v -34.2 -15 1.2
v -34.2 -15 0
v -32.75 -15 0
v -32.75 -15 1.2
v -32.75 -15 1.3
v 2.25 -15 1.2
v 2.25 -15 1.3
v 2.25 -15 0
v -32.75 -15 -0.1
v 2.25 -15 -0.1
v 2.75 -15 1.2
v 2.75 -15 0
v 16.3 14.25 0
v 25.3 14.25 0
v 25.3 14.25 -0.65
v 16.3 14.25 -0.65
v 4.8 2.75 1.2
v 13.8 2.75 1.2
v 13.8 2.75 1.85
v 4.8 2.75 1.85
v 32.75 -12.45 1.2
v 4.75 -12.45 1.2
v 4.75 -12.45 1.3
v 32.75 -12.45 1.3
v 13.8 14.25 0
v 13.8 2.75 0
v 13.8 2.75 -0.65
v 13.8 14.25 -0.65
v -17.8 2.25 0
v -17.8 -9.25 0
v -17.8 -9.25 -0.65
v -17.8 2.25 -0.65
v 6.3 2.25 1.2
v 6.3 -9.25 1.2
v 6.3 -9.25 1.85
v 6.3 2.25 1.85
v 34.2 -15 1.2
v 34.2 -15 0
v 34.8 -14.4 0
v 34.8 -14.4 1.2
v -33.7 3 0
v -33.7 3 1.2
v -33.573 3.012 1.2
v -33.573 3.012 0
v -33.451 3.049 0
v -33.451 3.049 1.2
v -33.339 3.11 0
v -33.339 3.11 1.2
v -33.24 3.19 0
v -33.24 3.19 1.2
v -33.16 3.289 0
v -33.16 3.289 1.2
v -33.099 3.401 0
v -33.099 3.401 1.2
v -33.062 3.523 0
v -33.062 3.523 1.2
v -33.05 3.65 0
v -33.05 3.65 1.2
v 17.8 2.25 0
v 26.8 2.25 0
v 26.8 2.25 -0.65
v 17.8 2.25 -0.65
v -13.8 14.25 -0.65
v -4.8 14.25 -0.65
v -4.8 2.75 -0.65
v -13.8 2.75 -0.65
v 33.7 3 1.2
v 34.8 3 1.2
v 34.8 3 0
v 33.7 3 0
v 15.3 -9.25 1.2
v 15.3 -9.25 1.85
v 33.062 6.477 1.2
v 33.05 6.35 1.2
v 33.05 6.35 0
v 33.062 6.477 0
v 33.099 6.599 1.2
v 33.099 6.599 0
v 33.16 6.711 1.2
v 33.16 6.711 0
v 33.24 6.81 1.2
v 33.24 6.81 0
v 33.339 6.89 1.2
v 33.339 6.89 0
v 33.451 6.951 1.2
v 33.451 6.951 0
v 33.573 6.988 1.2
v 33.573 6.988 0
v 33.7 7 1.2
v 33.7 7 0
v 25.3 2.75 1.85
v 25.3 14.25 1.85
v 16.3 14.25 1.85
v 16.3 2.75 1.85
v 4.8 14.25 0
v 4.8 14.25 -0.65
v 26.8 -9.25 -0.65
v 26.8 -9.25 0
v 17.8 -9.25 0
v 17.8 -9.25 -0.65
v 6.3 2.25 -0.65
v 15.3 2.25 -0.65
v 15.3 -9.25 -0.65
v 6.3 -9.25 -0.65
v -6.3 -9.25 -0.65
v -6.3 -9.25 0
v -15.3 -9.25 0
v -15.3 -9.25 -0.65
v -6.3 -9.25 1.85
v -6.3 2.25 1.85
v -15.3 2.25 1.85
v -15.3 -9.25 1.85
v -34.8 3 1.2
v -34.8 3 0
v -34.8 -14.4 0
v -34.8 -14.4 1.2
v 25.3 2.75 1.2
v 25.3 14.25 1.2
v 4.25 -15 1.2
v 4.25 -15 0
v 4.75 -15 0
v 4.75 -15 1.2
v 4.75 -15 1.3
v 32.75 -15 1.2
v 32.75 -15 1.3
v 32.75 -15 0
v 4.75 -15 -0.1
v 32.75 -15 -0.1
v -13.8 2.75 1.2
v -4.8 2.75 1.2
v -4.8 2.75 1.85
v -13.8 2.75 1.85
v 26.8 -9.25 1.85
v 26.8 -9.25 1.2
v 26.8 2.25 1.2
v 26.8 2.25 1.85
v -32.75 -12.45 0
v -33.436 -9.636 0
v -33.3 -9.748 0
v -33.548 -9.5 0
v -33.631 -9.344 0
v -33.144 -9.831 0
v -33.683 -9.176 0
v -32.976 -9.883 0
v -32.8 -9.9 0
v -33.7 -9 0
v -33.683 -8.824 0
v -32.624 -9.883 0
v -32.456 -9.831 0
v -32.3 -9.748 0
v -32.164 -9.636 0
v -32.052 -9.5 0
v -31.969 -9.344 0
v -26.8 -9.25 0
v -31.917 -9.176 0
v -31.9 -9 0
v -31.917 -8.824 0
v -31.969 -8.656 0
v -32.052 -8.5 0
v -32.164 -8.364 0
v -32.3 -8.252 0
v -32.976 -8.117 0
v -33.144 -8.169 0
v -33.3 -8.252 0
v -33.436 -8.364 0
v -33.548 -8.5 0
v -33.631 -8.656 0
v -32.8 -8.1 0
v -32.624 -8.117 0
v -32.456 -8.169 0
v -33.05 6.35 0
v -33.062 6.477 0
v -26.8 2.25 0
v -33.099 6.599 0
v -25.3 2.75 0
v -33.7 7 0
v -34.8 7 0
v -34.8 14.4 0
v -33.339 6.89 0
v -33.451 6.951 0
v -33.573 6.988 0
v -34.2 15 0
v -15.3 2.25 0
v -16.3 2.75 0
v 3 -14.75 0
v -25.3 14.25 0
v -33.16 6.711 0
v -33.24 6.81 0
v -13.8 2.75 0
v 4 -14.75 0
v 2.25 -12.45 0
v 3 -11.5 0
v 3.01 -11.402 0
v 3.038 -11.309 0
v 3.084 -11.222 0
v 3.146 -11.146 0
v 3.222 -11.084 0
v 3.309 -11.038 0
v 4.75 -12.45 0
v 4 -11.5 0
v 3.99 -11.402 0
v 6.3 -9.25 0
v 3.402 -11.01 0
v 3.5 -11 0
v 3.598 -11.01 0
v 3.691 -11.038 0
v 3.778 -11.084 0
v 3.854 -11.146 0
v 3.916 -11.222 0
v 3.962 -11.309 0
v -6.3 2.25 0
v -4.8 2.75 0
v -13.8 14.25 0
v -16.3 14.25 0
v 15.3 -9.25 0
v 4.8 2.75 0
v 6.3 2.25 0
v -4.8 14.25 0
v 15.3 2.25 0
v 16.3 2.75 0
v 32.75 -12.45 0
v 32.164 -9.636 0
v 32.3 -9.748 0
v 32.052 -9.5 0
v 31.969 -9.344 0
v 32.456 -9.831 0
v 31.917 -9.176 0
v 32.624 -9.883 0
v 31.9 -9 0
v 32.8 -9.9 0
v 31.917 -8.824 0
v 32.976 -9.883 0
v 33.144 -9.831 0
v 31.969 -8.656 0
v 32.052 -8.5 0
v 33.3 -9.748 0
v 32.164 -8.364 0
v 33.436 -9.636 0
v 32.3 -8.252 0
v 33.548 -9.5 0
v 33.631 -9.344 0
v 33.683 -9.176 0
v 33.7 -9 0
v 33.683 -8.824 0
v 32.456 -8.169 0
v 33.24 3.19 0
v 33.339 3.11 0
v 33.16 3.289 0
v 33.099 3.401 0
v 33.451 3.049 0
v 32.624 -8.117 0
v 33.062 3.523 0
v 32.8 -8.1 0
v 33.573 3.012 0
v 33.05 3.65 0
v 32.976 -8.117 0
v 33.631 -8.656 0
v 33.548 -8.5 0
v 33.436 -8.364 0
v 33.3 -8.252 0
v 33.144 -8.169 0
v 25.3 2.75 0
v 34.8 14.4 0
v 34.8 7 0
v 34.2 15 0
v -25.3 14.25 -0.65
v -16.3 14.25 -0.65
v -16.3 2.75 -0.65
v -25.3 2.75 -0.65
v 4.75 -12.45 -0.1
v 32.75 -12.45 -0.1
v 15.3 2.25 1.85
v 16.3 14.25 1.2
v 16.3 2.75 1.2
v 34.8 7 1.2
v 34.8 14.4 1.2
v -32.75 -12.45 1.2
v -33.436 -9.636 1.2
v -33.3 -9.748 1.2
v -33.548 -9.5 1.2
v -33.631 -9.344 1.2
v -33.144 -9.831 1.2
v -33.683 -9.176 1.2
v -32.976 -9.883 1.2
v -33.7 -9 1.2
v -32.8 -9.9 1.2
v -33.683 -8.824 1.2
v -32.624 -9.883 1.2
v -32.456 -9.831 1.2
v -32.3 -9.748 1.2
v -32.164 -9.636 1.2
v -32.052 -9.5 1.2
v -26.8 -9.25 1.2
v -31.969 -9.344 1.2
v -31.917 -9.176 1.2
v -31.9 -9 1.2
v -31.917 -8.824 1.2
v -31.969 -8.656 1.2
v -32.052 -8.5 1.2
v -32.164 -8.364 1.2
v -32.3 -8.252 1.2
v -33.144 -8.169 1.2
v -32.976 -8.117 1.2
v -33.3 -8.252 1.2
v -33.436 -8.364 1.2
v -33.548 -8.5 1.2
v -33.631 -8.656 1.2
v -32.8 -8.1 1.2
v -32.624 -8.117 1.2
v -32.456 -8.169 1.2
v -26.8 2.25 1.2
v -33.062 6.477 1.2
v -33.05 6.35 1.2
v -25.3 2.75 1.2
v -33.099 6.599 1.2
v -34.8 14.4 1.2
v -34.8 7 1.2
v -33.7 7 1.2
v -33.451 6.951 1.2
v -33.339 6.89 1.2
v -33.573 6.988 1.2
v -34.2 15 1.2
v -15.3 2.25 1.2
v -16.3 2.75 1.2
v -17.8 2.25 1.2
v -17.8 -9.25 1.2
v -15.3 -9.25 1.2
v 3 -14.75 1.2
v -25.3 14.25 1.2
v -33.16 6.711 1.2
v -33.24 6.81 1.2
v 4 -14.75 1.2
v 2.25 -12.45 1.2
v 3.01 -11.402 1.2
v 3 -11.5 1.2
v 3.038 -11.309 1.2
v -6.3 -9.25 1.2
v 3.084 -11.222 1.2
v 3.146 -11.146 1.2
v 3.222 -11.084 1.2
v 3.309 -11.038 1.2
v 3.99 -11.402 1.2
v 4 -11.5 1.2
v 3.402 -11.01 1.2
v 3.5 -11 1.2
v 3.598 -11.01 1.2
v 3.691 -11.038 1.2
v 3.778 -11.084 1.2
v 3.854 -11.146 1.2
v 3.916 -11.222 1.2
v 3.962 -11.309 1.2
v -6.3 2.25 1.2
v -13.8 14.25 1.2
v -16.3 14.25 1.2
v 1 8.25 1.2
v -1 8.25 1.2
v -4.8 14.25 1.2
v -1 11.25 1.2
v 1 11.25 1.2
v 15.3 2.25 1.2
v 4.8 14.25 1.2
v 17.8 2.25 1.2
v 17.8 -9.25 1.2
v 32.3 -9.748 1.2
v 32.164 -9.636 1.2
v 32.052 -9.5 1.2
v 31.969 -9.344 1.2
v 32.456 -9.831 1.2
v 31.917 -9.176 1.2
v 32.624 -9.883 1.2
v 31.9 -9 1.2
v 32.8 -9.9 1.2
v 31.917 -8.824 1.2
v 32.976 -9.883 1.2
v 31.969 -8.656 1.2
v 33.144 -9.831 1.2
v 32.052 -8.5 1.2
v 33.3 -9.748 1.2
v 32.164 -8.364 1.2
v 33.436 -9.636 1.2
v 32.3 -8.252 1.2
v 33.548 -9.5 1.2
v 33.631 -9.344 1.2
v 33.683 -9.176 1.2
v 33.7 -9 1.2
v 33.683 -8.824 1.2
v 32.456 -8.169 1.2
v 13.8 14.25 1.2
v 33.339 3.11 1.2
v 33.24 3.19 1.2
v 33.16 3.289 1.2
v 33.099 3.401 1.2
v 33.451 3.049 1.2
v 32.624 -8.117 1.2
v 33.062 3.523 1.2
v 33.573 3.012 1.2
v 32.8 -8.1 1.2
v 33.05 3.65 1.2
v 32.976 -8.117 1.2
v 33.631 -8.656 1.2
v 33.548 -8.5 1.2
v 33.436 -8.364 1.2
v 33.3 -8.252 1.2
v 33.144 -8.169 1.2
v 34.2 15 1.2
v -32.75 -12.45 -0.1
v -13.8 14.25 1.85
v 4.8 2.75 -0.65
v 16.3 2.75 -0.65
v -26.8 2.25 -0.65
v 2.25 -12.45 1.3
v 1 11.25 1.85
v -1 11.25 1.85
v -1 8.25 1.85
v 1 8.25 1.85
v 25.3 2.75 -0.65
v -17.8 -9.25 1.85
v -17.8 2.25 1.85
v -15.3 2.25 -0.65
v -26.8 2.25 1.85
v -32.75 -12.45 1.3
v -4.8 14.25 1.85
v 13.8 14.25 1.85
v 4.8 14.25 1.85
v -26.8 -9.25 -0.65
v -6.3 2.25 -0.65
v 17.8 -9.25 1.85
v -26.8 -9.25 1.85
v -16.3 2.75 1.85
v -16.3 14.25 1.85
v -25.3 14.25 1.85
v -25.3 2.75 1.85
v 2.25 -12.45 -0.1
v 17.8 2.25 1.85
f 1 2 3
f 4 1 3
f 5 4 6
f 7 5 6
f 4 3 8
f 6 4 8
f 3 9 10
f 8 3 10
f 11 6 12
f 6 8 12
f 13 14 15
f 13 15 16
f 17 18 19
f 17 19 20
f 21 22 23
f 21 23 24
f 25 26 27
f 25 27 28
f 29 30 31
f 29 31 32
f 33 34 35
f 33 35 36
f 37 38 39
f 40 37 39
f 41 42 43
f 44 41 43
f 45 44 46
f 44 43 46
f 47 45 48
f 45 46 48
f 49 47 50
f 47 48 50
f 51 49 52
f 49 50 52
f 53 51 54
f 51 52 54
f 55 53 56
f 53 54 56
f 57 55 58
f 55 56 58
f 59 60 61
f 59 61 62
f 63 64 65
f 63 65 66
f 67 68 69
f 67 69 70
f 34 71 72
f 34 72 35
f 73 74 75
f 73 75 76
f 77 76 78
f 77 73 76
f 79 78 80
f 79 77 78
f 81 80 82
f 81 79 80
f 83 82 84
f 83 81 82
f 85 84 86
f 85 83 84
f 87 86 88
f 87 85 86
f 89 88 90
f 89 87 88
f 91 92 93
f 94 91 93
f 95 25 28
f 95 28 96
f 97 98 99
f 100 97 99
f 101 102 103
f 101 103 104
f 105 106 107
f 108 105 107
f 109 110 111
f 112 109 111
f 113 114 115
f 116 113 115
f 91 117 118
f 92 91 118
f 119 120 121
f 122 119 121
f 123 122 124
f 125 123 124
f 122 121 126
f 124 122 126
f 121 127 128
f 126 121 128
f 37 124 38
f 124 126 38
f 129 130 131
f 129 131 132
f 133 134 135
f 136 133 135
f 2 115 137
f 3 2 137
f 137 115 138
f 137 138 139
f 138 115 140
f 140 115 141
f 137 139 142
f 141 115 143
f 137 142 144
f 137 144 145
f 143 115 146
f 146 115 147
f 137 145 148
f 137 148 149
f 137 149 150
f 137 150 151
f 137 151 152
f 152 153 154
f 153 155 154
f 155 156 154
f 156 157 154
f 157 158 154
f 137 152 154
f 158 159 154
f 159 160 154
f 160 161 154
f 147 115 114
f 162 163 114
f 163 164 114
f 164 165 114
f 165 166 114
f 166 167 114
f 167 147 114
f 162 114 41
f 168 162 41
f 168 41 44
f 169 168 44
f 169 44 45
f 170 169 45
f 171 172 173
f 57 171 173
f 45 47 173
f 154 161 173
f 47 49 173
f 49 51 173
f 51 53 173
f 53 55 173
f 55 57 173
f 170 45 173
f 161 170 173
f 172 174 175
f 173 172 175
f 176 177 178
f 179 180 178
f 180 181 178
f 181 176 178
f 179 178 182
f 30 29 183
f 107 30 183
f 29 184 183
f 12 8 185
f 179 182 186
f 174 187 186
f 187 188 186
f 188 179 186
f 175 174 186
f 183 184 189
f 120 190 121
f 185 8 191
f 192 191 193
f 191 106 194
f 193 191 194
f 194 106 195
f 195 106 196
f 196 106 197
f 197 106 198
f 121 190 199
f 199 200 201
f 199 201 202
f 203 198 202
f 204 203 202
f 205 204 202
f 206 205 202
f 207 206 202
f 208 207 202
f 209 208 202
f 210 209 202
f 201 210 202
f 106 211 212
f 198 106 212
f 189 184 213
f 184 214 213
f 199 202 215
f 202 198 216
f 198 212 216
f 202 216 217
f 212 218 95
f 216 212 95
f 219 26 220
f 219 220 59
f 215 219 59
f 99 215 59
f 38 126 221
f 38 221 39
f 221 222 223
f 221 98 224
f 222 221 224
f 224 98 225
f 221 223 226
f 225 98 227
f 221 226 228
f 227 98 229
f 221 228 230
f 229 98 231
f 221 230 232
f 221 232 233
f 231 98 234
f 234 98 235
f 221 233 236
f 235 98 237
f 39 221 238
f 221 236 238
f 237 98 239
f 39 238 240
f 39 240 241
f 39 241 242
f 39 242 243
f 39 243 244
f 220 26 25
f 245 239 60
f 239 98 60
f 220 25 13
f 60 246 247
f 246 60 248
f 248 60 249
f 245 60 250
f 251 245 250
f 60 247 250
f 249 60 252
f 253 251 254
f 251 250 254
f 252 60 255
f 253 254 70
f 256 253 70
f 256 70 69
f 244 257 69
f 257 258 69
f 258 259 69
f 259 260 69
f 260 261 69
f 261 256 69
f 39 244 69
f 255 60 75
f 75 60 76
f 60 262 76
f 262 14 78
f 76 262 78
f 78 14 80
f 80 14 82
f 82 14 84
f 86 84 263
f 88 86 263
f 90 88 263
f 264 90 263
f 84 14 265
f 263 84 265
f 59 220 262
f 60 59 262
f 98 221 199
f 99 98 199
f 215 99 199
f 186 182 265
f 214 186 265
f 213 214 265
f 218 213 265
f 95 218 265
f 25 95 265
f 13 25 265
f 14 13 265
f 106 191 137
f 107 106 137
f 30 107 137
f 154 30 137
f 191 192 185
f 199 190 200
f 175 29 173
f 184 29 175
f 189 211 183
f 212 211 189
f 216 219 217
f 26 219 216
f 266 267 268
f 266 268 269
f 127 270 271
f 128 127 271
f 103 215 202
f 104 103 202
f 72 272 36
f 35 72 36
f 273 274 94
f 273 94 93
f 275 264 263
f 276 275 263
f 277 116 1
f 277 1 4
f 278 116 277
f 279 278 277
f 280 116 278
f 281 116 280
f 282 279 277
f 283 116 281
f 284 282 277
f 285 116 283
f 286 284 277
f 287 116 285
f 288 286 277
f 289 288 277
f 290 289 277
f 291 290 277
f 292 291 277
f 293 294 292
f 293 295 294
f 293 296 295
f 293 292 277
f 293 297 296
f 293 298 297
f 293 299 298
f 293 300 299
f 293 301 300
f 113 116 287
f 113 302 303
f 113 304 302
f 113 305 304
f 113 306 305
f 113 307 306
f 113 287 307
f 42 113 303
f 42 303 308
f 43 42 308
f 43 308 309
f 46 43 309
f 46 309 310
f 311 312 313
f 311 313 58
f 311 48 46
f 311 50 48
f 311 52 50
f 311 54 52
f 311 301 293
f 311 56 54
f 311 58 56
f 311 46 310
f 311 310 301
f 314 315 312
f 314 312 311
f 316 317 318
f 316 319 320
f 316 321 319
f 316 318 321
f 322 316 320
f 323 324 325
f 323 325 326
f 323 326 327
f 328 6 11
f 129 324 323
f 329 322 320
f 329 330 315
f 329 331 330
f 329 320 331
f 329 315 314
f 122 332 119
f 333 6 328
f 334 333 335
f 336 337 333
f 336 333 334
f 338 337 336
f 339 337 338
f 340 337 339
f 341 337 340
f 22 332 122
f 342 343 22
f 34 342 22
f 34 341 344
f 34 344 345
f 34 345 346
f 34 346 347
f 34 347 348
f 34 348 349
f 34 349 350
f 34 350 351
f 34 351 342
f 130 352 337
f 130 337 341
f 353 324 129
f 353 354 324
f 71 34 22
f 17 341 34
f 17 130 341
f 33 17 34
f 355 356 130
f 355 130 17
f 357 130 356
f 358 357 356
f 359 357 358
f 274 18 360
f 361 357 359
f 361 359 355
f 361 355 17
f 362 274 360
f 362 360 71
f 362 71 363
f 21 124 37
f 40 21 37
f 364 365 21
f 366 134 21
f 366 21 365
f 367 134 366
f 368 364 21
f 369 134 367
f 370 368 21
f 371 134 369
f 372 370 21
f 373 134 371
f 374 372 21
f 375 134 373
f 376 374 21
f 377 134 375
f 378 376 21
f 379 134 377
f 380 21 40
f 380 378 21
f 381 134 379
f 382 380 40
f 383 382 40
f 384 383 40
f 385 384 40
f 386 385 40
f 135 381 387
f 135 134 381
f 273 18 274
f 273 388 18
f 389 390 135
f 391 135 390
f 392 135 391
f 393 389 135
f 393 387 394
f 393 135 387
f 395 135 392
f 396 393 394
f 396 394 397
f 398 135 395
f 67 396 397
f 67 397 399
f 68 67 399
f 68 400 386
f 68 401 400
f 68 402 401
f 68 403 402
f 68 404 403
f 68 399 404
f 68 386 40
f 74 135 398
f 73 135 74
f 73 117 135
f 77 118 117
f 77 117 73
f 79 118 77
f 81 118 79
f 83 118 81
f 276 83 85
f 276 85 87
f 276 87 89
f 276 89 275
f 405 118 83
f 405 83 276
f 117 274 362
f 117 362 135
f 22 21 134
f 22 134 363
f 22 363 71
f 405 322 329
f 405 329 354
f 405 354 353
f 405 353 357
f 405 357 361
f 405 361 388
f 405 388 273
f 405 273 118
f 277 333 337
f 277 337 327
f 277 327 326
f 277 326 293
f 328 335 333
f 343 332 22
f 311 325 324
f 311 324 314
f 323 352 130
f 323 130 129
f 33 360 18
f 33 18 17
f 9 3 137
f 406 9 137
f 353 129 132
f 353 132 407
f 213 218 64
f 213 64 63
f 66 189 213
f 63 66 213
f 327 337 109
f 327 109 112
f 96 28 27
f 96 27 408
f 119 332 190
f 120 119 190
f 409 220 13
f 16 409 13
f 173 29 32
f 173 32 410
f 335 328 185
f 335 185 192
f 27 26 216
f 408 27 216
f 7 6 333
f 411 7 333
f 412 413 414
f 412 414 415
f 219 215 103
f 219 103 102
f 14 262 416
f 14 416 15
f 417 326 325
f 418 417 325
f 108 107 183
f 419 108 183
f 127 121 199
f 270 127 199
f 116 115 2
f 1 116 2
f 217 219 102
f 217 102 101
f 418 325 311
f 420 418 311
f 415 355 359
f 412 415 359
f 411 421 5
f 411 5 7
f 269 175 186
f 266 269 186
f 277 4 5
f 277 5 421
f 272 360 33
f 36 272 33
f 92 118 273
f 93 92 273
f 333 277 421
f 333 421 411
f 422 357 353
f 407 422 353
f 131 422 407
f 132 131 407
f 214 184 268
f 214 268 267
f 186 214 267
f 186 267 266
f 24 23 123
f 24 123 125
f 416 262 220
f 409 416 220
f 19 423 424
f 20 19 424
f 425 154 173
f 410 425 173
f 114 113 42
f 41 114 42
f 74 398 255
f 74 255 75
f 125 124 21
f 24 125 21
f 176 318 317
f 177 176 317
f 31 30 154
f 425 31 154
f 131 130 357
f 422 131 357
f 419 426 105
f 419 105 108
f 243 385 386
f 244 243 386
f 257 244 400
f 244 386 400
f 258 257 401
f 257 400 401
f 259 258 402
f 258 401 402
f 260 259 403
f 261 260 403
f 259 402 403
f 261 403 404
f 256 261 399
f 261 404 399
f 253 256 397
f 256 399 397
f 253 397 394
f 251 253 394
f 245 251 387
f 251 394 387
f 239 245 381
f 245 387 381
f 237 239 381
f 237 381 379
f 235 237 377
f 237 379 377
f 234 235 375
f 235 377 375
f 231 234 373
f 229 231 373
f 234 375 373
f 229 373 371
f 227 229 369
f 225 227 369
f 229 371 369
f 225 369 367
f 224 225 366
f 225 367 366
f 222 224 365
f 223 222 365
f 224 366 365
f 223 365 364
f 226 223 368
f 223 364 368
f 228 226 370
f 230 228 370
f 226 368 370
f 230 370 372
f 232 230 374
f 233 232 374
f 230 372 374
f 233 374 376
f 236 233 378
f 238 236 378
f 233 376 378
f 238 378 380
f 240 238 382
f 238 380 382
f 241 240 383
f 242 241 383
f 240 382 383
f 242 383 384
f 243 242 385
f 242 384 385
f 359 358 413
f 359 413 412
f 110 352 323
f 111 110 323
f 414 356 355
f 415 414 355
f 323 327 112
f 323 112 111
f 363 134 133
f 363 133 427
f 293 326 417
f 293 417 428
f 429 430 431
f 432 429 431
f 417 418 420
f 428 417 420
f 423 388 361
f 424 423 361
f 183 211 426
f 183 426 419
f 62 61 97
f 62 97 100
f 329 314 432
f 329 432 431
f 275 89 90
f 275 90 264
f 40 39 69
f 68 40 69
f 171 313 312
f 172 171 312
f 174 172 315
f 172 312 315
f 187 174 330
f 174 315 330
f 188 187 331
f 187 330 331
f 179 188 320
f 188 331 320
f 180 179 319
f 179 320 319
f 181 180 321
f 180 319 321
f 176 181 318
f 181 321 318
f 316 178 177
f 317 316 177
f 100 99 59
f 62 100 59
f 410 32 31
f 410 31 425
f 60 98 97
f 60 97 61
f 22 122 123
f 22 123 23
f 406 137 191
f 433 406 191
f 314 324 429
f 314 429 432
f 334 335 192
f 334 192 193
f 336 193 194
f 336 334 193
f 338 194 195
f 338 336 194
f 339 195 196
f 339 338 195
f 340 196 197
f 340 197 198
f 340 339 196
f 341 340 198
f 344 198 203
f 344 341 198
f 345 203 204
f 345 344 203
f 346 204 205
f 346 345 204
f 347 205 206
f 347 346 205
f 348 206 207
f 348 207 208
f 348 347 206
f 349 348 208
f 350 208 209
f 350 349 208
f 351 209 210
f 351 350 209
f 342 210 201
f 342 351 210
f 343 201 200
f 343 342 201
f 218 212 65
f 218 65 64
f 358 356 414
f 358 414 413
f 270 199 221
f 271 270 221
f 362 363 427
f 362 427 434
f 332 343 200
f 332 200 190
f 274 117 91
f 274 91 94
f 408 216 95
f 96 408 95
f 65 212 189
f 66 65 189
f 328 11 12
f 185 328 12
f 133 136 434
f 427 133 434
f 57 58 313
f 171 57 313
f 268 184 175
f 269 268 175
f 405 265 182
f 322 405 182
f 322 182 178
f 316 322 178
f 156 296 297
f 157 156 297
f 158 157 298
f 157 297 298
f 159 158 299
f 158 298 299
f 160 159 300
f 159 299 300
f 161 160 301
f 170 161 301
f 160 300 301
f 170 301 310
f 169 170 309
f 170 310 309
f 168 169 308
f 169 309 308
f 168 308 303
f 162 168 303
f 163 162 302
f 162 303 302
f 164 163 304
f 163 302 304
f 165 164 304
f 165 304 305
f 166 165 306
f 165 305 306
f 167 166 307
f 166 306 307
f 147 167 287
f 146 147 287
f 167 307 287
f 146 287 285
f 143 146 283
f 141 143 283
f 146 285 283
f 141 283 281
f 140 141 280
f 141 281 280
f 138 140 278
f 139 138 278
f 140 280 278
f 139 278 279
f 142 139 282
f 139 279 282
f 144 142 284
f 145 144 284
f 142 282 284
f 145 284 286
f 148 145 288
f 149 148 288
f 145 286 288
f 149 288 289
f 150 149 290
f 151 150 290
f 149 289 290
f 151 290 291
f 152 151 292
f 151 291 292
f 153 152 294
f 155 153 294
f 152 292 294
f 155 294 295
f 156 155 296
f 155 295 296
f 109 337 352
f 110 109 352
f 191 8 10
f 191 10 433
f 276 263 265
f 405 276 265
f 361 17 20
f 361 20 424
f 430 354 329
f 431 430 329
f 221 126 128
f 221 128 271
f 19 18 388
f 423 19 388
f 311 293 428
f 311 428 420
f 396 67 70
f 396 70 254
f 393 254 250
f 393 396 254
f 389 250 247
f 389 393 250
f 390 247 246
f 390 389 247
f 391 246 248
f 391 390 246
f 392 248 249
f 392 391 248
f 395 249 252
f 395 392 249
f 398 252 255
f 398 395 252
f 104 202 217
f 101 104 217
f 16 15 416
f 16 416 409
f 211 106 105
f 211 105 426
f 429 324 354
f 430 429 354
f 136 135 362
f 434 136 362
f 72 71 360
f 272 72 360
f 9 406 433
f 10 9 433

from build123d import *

# Parameters (mm, degrees)
MAIN_BOARD_DEPTH    = 1.2
SKETCH2_R           = 0.9
DETAIL_CUTS_DEPTH   = 1.2
CHAMFER1_SIZE       = 0.25
SKETCH3_W           = 9
SKETCH3_H           = 11.5
SOC1_DEPTH          = 0.65
SOC1_DEPTH_BACK     = 1.85
SKETCH4_W           = 2
SKETCH4_H           = 3
SOC2_DEPTH          = 0.65
SKETCH5_W           = 35
SKETCH5_H           = 2.55
SKETCH5_W_2         = 28
CONTACTS_DEPTH      = 0.1
CONTACTS_DEPTH_BACK = 1.3


with BuildPart() as part:
    # Sketch1 → Main Board (new body)
    with BuildSketch(Plane.XY):
        Polygon((-34.2, 15), (-34.8, 14.4), (-34.8, -14.4), (-34.2, -15), (34.2, -15), (34.8, -14.4), (34.8, 14.4), (34.2, 15), align=None)
    extrude(amount=MAIN_BOARD_DEPTH)

    # Sketch2 → Detail Cuts (cut)
    with BuildSketch(Plane.XY.offset(1.2)):
        with Locations((-32.8, -9)):
            Circle(SKETCH2_R)
        with Locations((32.8, -9)):
            Circle(SKETCH2_R)
        with BuildLine():
            Line((-36.55, 3), (-33.7, 3))
            ThreePointArc((-33.7, 3), (-33.240380592, 3.190380592), (-33.05, 3.65))
            Line((-33.05, 3.65), (-33.05, 6.35))
            ThreePointArc((-33.05, 6.35), (-33.240380592, 6.809619408), (-33.7, 7))
            Line((-33.7, 7), (-36.55, 7))
            Line((-36.55, 7), (-36.55, 3))
        make_face()
        with BuildLine():
            Line((33.05, 3.65), (33.05, 6.35))
            ThreePointArc((33.05, 6.35), (33.240380592, 6.809619408), (33.7, 7))
            Line((33.7, 7), (36.55, 7))
            Line((36.55, 7), (36.55, 3))
            Line((36.55, 3), (33.7, 3))
            ThreePointArc((33.7, 3), (33.240380592, 3.190380592), (33.05, 3.65))
        make_face()
        with BuildLine():
            Line((3, -15), (3, -11.5))
            ThreePointArc((3, -11.5), (3.5, -11), (4, -11.5))
            Line((4, -11.5), (4, -15))
            ThreePointArc((4, -15), (3.5, -15.5), (3, -15))
        make_face()
    extrude(amount=-DETAIL_CUTS_DEPTH, mode=Mode.SUBTRACT)

    # Chamfer1
    chamfer1_edges = [part.edges().sort_by_distance(p)[0] for p in [
        (4, -15, 0.6),
        (3, -15, 0.6),
    ]]
    chamfer(chamfer1_edges, length=CHAMFER1_SIZE)

    # Sketch3 → SOC1 (add, two sides)
    with BuildSketch(Plane(origin=(0, 0, 0), x_dir=(-1, 0, 0), z_dir=(0, 0, -1))) as soc1_sk:
        with Locations((-20.8, 8.5)):
            Rectangle(SKETCH3_W, SKETCH3_H)
        with Locations((-9.3, 8.5)):
            Rectangle(SKETCH3_W, SKETCH3_H)
        with Locations((10.8, -3.5)):
            Rectangle(SKETCH3_W, SKETCH3_H)
        with Locations((-22.3, -3.5)):
            Rectangle(SKETCH3_W, SKETCH3_H)
        with Locations((-10.8, -3.5)):
            Rectangle(SKETCH3_W, SKETCH3_H)
        with Locations((22.3, -3.5)):
            Rectangle(SKETCH3_W, SKETCH3_H)
        with Locations((9.3, 8.5)):
            Rectangle(SKETCH3_W, SKETCH3_H)
        with Locations((20.8, 8.5)):
            Rectangle(SKETCH3_W, SKETCH3_H)
    extrude(amount=SOC1_DEPTH)
    extrude(soc1_sk.sketch, amount=-SOC1_DEPTH_BACK)

    # Sketch4 → SOC2 (add)
    with BuildSketch(Plane.XY.offset(1.2)):
        with Locations((0, 9.75)):
            Rectangle(SKETCH4_W, SKETCH4_H)
    extrude(amount=SOC2_DEPTH)

    # Sketch5 → Contacts (add, two sides)
    with BuildSketch(Plane.XY.offset(1.2)) as contacts_sk:
        with Locations((-15.25, -13.725)):
            Rectangle(SKETCH5_W, SKETCH5_H)
        with Locations((18.75, -13.725)):
            Rectangle(SKETCH5_W_2, SKETCH5_H)
    extrude(amount=CONTACTS_DEPTH)
    extrude(contacts_sk.sketch, amount=-CONTACTS_DEPTH_BACK)


solid = part.part
